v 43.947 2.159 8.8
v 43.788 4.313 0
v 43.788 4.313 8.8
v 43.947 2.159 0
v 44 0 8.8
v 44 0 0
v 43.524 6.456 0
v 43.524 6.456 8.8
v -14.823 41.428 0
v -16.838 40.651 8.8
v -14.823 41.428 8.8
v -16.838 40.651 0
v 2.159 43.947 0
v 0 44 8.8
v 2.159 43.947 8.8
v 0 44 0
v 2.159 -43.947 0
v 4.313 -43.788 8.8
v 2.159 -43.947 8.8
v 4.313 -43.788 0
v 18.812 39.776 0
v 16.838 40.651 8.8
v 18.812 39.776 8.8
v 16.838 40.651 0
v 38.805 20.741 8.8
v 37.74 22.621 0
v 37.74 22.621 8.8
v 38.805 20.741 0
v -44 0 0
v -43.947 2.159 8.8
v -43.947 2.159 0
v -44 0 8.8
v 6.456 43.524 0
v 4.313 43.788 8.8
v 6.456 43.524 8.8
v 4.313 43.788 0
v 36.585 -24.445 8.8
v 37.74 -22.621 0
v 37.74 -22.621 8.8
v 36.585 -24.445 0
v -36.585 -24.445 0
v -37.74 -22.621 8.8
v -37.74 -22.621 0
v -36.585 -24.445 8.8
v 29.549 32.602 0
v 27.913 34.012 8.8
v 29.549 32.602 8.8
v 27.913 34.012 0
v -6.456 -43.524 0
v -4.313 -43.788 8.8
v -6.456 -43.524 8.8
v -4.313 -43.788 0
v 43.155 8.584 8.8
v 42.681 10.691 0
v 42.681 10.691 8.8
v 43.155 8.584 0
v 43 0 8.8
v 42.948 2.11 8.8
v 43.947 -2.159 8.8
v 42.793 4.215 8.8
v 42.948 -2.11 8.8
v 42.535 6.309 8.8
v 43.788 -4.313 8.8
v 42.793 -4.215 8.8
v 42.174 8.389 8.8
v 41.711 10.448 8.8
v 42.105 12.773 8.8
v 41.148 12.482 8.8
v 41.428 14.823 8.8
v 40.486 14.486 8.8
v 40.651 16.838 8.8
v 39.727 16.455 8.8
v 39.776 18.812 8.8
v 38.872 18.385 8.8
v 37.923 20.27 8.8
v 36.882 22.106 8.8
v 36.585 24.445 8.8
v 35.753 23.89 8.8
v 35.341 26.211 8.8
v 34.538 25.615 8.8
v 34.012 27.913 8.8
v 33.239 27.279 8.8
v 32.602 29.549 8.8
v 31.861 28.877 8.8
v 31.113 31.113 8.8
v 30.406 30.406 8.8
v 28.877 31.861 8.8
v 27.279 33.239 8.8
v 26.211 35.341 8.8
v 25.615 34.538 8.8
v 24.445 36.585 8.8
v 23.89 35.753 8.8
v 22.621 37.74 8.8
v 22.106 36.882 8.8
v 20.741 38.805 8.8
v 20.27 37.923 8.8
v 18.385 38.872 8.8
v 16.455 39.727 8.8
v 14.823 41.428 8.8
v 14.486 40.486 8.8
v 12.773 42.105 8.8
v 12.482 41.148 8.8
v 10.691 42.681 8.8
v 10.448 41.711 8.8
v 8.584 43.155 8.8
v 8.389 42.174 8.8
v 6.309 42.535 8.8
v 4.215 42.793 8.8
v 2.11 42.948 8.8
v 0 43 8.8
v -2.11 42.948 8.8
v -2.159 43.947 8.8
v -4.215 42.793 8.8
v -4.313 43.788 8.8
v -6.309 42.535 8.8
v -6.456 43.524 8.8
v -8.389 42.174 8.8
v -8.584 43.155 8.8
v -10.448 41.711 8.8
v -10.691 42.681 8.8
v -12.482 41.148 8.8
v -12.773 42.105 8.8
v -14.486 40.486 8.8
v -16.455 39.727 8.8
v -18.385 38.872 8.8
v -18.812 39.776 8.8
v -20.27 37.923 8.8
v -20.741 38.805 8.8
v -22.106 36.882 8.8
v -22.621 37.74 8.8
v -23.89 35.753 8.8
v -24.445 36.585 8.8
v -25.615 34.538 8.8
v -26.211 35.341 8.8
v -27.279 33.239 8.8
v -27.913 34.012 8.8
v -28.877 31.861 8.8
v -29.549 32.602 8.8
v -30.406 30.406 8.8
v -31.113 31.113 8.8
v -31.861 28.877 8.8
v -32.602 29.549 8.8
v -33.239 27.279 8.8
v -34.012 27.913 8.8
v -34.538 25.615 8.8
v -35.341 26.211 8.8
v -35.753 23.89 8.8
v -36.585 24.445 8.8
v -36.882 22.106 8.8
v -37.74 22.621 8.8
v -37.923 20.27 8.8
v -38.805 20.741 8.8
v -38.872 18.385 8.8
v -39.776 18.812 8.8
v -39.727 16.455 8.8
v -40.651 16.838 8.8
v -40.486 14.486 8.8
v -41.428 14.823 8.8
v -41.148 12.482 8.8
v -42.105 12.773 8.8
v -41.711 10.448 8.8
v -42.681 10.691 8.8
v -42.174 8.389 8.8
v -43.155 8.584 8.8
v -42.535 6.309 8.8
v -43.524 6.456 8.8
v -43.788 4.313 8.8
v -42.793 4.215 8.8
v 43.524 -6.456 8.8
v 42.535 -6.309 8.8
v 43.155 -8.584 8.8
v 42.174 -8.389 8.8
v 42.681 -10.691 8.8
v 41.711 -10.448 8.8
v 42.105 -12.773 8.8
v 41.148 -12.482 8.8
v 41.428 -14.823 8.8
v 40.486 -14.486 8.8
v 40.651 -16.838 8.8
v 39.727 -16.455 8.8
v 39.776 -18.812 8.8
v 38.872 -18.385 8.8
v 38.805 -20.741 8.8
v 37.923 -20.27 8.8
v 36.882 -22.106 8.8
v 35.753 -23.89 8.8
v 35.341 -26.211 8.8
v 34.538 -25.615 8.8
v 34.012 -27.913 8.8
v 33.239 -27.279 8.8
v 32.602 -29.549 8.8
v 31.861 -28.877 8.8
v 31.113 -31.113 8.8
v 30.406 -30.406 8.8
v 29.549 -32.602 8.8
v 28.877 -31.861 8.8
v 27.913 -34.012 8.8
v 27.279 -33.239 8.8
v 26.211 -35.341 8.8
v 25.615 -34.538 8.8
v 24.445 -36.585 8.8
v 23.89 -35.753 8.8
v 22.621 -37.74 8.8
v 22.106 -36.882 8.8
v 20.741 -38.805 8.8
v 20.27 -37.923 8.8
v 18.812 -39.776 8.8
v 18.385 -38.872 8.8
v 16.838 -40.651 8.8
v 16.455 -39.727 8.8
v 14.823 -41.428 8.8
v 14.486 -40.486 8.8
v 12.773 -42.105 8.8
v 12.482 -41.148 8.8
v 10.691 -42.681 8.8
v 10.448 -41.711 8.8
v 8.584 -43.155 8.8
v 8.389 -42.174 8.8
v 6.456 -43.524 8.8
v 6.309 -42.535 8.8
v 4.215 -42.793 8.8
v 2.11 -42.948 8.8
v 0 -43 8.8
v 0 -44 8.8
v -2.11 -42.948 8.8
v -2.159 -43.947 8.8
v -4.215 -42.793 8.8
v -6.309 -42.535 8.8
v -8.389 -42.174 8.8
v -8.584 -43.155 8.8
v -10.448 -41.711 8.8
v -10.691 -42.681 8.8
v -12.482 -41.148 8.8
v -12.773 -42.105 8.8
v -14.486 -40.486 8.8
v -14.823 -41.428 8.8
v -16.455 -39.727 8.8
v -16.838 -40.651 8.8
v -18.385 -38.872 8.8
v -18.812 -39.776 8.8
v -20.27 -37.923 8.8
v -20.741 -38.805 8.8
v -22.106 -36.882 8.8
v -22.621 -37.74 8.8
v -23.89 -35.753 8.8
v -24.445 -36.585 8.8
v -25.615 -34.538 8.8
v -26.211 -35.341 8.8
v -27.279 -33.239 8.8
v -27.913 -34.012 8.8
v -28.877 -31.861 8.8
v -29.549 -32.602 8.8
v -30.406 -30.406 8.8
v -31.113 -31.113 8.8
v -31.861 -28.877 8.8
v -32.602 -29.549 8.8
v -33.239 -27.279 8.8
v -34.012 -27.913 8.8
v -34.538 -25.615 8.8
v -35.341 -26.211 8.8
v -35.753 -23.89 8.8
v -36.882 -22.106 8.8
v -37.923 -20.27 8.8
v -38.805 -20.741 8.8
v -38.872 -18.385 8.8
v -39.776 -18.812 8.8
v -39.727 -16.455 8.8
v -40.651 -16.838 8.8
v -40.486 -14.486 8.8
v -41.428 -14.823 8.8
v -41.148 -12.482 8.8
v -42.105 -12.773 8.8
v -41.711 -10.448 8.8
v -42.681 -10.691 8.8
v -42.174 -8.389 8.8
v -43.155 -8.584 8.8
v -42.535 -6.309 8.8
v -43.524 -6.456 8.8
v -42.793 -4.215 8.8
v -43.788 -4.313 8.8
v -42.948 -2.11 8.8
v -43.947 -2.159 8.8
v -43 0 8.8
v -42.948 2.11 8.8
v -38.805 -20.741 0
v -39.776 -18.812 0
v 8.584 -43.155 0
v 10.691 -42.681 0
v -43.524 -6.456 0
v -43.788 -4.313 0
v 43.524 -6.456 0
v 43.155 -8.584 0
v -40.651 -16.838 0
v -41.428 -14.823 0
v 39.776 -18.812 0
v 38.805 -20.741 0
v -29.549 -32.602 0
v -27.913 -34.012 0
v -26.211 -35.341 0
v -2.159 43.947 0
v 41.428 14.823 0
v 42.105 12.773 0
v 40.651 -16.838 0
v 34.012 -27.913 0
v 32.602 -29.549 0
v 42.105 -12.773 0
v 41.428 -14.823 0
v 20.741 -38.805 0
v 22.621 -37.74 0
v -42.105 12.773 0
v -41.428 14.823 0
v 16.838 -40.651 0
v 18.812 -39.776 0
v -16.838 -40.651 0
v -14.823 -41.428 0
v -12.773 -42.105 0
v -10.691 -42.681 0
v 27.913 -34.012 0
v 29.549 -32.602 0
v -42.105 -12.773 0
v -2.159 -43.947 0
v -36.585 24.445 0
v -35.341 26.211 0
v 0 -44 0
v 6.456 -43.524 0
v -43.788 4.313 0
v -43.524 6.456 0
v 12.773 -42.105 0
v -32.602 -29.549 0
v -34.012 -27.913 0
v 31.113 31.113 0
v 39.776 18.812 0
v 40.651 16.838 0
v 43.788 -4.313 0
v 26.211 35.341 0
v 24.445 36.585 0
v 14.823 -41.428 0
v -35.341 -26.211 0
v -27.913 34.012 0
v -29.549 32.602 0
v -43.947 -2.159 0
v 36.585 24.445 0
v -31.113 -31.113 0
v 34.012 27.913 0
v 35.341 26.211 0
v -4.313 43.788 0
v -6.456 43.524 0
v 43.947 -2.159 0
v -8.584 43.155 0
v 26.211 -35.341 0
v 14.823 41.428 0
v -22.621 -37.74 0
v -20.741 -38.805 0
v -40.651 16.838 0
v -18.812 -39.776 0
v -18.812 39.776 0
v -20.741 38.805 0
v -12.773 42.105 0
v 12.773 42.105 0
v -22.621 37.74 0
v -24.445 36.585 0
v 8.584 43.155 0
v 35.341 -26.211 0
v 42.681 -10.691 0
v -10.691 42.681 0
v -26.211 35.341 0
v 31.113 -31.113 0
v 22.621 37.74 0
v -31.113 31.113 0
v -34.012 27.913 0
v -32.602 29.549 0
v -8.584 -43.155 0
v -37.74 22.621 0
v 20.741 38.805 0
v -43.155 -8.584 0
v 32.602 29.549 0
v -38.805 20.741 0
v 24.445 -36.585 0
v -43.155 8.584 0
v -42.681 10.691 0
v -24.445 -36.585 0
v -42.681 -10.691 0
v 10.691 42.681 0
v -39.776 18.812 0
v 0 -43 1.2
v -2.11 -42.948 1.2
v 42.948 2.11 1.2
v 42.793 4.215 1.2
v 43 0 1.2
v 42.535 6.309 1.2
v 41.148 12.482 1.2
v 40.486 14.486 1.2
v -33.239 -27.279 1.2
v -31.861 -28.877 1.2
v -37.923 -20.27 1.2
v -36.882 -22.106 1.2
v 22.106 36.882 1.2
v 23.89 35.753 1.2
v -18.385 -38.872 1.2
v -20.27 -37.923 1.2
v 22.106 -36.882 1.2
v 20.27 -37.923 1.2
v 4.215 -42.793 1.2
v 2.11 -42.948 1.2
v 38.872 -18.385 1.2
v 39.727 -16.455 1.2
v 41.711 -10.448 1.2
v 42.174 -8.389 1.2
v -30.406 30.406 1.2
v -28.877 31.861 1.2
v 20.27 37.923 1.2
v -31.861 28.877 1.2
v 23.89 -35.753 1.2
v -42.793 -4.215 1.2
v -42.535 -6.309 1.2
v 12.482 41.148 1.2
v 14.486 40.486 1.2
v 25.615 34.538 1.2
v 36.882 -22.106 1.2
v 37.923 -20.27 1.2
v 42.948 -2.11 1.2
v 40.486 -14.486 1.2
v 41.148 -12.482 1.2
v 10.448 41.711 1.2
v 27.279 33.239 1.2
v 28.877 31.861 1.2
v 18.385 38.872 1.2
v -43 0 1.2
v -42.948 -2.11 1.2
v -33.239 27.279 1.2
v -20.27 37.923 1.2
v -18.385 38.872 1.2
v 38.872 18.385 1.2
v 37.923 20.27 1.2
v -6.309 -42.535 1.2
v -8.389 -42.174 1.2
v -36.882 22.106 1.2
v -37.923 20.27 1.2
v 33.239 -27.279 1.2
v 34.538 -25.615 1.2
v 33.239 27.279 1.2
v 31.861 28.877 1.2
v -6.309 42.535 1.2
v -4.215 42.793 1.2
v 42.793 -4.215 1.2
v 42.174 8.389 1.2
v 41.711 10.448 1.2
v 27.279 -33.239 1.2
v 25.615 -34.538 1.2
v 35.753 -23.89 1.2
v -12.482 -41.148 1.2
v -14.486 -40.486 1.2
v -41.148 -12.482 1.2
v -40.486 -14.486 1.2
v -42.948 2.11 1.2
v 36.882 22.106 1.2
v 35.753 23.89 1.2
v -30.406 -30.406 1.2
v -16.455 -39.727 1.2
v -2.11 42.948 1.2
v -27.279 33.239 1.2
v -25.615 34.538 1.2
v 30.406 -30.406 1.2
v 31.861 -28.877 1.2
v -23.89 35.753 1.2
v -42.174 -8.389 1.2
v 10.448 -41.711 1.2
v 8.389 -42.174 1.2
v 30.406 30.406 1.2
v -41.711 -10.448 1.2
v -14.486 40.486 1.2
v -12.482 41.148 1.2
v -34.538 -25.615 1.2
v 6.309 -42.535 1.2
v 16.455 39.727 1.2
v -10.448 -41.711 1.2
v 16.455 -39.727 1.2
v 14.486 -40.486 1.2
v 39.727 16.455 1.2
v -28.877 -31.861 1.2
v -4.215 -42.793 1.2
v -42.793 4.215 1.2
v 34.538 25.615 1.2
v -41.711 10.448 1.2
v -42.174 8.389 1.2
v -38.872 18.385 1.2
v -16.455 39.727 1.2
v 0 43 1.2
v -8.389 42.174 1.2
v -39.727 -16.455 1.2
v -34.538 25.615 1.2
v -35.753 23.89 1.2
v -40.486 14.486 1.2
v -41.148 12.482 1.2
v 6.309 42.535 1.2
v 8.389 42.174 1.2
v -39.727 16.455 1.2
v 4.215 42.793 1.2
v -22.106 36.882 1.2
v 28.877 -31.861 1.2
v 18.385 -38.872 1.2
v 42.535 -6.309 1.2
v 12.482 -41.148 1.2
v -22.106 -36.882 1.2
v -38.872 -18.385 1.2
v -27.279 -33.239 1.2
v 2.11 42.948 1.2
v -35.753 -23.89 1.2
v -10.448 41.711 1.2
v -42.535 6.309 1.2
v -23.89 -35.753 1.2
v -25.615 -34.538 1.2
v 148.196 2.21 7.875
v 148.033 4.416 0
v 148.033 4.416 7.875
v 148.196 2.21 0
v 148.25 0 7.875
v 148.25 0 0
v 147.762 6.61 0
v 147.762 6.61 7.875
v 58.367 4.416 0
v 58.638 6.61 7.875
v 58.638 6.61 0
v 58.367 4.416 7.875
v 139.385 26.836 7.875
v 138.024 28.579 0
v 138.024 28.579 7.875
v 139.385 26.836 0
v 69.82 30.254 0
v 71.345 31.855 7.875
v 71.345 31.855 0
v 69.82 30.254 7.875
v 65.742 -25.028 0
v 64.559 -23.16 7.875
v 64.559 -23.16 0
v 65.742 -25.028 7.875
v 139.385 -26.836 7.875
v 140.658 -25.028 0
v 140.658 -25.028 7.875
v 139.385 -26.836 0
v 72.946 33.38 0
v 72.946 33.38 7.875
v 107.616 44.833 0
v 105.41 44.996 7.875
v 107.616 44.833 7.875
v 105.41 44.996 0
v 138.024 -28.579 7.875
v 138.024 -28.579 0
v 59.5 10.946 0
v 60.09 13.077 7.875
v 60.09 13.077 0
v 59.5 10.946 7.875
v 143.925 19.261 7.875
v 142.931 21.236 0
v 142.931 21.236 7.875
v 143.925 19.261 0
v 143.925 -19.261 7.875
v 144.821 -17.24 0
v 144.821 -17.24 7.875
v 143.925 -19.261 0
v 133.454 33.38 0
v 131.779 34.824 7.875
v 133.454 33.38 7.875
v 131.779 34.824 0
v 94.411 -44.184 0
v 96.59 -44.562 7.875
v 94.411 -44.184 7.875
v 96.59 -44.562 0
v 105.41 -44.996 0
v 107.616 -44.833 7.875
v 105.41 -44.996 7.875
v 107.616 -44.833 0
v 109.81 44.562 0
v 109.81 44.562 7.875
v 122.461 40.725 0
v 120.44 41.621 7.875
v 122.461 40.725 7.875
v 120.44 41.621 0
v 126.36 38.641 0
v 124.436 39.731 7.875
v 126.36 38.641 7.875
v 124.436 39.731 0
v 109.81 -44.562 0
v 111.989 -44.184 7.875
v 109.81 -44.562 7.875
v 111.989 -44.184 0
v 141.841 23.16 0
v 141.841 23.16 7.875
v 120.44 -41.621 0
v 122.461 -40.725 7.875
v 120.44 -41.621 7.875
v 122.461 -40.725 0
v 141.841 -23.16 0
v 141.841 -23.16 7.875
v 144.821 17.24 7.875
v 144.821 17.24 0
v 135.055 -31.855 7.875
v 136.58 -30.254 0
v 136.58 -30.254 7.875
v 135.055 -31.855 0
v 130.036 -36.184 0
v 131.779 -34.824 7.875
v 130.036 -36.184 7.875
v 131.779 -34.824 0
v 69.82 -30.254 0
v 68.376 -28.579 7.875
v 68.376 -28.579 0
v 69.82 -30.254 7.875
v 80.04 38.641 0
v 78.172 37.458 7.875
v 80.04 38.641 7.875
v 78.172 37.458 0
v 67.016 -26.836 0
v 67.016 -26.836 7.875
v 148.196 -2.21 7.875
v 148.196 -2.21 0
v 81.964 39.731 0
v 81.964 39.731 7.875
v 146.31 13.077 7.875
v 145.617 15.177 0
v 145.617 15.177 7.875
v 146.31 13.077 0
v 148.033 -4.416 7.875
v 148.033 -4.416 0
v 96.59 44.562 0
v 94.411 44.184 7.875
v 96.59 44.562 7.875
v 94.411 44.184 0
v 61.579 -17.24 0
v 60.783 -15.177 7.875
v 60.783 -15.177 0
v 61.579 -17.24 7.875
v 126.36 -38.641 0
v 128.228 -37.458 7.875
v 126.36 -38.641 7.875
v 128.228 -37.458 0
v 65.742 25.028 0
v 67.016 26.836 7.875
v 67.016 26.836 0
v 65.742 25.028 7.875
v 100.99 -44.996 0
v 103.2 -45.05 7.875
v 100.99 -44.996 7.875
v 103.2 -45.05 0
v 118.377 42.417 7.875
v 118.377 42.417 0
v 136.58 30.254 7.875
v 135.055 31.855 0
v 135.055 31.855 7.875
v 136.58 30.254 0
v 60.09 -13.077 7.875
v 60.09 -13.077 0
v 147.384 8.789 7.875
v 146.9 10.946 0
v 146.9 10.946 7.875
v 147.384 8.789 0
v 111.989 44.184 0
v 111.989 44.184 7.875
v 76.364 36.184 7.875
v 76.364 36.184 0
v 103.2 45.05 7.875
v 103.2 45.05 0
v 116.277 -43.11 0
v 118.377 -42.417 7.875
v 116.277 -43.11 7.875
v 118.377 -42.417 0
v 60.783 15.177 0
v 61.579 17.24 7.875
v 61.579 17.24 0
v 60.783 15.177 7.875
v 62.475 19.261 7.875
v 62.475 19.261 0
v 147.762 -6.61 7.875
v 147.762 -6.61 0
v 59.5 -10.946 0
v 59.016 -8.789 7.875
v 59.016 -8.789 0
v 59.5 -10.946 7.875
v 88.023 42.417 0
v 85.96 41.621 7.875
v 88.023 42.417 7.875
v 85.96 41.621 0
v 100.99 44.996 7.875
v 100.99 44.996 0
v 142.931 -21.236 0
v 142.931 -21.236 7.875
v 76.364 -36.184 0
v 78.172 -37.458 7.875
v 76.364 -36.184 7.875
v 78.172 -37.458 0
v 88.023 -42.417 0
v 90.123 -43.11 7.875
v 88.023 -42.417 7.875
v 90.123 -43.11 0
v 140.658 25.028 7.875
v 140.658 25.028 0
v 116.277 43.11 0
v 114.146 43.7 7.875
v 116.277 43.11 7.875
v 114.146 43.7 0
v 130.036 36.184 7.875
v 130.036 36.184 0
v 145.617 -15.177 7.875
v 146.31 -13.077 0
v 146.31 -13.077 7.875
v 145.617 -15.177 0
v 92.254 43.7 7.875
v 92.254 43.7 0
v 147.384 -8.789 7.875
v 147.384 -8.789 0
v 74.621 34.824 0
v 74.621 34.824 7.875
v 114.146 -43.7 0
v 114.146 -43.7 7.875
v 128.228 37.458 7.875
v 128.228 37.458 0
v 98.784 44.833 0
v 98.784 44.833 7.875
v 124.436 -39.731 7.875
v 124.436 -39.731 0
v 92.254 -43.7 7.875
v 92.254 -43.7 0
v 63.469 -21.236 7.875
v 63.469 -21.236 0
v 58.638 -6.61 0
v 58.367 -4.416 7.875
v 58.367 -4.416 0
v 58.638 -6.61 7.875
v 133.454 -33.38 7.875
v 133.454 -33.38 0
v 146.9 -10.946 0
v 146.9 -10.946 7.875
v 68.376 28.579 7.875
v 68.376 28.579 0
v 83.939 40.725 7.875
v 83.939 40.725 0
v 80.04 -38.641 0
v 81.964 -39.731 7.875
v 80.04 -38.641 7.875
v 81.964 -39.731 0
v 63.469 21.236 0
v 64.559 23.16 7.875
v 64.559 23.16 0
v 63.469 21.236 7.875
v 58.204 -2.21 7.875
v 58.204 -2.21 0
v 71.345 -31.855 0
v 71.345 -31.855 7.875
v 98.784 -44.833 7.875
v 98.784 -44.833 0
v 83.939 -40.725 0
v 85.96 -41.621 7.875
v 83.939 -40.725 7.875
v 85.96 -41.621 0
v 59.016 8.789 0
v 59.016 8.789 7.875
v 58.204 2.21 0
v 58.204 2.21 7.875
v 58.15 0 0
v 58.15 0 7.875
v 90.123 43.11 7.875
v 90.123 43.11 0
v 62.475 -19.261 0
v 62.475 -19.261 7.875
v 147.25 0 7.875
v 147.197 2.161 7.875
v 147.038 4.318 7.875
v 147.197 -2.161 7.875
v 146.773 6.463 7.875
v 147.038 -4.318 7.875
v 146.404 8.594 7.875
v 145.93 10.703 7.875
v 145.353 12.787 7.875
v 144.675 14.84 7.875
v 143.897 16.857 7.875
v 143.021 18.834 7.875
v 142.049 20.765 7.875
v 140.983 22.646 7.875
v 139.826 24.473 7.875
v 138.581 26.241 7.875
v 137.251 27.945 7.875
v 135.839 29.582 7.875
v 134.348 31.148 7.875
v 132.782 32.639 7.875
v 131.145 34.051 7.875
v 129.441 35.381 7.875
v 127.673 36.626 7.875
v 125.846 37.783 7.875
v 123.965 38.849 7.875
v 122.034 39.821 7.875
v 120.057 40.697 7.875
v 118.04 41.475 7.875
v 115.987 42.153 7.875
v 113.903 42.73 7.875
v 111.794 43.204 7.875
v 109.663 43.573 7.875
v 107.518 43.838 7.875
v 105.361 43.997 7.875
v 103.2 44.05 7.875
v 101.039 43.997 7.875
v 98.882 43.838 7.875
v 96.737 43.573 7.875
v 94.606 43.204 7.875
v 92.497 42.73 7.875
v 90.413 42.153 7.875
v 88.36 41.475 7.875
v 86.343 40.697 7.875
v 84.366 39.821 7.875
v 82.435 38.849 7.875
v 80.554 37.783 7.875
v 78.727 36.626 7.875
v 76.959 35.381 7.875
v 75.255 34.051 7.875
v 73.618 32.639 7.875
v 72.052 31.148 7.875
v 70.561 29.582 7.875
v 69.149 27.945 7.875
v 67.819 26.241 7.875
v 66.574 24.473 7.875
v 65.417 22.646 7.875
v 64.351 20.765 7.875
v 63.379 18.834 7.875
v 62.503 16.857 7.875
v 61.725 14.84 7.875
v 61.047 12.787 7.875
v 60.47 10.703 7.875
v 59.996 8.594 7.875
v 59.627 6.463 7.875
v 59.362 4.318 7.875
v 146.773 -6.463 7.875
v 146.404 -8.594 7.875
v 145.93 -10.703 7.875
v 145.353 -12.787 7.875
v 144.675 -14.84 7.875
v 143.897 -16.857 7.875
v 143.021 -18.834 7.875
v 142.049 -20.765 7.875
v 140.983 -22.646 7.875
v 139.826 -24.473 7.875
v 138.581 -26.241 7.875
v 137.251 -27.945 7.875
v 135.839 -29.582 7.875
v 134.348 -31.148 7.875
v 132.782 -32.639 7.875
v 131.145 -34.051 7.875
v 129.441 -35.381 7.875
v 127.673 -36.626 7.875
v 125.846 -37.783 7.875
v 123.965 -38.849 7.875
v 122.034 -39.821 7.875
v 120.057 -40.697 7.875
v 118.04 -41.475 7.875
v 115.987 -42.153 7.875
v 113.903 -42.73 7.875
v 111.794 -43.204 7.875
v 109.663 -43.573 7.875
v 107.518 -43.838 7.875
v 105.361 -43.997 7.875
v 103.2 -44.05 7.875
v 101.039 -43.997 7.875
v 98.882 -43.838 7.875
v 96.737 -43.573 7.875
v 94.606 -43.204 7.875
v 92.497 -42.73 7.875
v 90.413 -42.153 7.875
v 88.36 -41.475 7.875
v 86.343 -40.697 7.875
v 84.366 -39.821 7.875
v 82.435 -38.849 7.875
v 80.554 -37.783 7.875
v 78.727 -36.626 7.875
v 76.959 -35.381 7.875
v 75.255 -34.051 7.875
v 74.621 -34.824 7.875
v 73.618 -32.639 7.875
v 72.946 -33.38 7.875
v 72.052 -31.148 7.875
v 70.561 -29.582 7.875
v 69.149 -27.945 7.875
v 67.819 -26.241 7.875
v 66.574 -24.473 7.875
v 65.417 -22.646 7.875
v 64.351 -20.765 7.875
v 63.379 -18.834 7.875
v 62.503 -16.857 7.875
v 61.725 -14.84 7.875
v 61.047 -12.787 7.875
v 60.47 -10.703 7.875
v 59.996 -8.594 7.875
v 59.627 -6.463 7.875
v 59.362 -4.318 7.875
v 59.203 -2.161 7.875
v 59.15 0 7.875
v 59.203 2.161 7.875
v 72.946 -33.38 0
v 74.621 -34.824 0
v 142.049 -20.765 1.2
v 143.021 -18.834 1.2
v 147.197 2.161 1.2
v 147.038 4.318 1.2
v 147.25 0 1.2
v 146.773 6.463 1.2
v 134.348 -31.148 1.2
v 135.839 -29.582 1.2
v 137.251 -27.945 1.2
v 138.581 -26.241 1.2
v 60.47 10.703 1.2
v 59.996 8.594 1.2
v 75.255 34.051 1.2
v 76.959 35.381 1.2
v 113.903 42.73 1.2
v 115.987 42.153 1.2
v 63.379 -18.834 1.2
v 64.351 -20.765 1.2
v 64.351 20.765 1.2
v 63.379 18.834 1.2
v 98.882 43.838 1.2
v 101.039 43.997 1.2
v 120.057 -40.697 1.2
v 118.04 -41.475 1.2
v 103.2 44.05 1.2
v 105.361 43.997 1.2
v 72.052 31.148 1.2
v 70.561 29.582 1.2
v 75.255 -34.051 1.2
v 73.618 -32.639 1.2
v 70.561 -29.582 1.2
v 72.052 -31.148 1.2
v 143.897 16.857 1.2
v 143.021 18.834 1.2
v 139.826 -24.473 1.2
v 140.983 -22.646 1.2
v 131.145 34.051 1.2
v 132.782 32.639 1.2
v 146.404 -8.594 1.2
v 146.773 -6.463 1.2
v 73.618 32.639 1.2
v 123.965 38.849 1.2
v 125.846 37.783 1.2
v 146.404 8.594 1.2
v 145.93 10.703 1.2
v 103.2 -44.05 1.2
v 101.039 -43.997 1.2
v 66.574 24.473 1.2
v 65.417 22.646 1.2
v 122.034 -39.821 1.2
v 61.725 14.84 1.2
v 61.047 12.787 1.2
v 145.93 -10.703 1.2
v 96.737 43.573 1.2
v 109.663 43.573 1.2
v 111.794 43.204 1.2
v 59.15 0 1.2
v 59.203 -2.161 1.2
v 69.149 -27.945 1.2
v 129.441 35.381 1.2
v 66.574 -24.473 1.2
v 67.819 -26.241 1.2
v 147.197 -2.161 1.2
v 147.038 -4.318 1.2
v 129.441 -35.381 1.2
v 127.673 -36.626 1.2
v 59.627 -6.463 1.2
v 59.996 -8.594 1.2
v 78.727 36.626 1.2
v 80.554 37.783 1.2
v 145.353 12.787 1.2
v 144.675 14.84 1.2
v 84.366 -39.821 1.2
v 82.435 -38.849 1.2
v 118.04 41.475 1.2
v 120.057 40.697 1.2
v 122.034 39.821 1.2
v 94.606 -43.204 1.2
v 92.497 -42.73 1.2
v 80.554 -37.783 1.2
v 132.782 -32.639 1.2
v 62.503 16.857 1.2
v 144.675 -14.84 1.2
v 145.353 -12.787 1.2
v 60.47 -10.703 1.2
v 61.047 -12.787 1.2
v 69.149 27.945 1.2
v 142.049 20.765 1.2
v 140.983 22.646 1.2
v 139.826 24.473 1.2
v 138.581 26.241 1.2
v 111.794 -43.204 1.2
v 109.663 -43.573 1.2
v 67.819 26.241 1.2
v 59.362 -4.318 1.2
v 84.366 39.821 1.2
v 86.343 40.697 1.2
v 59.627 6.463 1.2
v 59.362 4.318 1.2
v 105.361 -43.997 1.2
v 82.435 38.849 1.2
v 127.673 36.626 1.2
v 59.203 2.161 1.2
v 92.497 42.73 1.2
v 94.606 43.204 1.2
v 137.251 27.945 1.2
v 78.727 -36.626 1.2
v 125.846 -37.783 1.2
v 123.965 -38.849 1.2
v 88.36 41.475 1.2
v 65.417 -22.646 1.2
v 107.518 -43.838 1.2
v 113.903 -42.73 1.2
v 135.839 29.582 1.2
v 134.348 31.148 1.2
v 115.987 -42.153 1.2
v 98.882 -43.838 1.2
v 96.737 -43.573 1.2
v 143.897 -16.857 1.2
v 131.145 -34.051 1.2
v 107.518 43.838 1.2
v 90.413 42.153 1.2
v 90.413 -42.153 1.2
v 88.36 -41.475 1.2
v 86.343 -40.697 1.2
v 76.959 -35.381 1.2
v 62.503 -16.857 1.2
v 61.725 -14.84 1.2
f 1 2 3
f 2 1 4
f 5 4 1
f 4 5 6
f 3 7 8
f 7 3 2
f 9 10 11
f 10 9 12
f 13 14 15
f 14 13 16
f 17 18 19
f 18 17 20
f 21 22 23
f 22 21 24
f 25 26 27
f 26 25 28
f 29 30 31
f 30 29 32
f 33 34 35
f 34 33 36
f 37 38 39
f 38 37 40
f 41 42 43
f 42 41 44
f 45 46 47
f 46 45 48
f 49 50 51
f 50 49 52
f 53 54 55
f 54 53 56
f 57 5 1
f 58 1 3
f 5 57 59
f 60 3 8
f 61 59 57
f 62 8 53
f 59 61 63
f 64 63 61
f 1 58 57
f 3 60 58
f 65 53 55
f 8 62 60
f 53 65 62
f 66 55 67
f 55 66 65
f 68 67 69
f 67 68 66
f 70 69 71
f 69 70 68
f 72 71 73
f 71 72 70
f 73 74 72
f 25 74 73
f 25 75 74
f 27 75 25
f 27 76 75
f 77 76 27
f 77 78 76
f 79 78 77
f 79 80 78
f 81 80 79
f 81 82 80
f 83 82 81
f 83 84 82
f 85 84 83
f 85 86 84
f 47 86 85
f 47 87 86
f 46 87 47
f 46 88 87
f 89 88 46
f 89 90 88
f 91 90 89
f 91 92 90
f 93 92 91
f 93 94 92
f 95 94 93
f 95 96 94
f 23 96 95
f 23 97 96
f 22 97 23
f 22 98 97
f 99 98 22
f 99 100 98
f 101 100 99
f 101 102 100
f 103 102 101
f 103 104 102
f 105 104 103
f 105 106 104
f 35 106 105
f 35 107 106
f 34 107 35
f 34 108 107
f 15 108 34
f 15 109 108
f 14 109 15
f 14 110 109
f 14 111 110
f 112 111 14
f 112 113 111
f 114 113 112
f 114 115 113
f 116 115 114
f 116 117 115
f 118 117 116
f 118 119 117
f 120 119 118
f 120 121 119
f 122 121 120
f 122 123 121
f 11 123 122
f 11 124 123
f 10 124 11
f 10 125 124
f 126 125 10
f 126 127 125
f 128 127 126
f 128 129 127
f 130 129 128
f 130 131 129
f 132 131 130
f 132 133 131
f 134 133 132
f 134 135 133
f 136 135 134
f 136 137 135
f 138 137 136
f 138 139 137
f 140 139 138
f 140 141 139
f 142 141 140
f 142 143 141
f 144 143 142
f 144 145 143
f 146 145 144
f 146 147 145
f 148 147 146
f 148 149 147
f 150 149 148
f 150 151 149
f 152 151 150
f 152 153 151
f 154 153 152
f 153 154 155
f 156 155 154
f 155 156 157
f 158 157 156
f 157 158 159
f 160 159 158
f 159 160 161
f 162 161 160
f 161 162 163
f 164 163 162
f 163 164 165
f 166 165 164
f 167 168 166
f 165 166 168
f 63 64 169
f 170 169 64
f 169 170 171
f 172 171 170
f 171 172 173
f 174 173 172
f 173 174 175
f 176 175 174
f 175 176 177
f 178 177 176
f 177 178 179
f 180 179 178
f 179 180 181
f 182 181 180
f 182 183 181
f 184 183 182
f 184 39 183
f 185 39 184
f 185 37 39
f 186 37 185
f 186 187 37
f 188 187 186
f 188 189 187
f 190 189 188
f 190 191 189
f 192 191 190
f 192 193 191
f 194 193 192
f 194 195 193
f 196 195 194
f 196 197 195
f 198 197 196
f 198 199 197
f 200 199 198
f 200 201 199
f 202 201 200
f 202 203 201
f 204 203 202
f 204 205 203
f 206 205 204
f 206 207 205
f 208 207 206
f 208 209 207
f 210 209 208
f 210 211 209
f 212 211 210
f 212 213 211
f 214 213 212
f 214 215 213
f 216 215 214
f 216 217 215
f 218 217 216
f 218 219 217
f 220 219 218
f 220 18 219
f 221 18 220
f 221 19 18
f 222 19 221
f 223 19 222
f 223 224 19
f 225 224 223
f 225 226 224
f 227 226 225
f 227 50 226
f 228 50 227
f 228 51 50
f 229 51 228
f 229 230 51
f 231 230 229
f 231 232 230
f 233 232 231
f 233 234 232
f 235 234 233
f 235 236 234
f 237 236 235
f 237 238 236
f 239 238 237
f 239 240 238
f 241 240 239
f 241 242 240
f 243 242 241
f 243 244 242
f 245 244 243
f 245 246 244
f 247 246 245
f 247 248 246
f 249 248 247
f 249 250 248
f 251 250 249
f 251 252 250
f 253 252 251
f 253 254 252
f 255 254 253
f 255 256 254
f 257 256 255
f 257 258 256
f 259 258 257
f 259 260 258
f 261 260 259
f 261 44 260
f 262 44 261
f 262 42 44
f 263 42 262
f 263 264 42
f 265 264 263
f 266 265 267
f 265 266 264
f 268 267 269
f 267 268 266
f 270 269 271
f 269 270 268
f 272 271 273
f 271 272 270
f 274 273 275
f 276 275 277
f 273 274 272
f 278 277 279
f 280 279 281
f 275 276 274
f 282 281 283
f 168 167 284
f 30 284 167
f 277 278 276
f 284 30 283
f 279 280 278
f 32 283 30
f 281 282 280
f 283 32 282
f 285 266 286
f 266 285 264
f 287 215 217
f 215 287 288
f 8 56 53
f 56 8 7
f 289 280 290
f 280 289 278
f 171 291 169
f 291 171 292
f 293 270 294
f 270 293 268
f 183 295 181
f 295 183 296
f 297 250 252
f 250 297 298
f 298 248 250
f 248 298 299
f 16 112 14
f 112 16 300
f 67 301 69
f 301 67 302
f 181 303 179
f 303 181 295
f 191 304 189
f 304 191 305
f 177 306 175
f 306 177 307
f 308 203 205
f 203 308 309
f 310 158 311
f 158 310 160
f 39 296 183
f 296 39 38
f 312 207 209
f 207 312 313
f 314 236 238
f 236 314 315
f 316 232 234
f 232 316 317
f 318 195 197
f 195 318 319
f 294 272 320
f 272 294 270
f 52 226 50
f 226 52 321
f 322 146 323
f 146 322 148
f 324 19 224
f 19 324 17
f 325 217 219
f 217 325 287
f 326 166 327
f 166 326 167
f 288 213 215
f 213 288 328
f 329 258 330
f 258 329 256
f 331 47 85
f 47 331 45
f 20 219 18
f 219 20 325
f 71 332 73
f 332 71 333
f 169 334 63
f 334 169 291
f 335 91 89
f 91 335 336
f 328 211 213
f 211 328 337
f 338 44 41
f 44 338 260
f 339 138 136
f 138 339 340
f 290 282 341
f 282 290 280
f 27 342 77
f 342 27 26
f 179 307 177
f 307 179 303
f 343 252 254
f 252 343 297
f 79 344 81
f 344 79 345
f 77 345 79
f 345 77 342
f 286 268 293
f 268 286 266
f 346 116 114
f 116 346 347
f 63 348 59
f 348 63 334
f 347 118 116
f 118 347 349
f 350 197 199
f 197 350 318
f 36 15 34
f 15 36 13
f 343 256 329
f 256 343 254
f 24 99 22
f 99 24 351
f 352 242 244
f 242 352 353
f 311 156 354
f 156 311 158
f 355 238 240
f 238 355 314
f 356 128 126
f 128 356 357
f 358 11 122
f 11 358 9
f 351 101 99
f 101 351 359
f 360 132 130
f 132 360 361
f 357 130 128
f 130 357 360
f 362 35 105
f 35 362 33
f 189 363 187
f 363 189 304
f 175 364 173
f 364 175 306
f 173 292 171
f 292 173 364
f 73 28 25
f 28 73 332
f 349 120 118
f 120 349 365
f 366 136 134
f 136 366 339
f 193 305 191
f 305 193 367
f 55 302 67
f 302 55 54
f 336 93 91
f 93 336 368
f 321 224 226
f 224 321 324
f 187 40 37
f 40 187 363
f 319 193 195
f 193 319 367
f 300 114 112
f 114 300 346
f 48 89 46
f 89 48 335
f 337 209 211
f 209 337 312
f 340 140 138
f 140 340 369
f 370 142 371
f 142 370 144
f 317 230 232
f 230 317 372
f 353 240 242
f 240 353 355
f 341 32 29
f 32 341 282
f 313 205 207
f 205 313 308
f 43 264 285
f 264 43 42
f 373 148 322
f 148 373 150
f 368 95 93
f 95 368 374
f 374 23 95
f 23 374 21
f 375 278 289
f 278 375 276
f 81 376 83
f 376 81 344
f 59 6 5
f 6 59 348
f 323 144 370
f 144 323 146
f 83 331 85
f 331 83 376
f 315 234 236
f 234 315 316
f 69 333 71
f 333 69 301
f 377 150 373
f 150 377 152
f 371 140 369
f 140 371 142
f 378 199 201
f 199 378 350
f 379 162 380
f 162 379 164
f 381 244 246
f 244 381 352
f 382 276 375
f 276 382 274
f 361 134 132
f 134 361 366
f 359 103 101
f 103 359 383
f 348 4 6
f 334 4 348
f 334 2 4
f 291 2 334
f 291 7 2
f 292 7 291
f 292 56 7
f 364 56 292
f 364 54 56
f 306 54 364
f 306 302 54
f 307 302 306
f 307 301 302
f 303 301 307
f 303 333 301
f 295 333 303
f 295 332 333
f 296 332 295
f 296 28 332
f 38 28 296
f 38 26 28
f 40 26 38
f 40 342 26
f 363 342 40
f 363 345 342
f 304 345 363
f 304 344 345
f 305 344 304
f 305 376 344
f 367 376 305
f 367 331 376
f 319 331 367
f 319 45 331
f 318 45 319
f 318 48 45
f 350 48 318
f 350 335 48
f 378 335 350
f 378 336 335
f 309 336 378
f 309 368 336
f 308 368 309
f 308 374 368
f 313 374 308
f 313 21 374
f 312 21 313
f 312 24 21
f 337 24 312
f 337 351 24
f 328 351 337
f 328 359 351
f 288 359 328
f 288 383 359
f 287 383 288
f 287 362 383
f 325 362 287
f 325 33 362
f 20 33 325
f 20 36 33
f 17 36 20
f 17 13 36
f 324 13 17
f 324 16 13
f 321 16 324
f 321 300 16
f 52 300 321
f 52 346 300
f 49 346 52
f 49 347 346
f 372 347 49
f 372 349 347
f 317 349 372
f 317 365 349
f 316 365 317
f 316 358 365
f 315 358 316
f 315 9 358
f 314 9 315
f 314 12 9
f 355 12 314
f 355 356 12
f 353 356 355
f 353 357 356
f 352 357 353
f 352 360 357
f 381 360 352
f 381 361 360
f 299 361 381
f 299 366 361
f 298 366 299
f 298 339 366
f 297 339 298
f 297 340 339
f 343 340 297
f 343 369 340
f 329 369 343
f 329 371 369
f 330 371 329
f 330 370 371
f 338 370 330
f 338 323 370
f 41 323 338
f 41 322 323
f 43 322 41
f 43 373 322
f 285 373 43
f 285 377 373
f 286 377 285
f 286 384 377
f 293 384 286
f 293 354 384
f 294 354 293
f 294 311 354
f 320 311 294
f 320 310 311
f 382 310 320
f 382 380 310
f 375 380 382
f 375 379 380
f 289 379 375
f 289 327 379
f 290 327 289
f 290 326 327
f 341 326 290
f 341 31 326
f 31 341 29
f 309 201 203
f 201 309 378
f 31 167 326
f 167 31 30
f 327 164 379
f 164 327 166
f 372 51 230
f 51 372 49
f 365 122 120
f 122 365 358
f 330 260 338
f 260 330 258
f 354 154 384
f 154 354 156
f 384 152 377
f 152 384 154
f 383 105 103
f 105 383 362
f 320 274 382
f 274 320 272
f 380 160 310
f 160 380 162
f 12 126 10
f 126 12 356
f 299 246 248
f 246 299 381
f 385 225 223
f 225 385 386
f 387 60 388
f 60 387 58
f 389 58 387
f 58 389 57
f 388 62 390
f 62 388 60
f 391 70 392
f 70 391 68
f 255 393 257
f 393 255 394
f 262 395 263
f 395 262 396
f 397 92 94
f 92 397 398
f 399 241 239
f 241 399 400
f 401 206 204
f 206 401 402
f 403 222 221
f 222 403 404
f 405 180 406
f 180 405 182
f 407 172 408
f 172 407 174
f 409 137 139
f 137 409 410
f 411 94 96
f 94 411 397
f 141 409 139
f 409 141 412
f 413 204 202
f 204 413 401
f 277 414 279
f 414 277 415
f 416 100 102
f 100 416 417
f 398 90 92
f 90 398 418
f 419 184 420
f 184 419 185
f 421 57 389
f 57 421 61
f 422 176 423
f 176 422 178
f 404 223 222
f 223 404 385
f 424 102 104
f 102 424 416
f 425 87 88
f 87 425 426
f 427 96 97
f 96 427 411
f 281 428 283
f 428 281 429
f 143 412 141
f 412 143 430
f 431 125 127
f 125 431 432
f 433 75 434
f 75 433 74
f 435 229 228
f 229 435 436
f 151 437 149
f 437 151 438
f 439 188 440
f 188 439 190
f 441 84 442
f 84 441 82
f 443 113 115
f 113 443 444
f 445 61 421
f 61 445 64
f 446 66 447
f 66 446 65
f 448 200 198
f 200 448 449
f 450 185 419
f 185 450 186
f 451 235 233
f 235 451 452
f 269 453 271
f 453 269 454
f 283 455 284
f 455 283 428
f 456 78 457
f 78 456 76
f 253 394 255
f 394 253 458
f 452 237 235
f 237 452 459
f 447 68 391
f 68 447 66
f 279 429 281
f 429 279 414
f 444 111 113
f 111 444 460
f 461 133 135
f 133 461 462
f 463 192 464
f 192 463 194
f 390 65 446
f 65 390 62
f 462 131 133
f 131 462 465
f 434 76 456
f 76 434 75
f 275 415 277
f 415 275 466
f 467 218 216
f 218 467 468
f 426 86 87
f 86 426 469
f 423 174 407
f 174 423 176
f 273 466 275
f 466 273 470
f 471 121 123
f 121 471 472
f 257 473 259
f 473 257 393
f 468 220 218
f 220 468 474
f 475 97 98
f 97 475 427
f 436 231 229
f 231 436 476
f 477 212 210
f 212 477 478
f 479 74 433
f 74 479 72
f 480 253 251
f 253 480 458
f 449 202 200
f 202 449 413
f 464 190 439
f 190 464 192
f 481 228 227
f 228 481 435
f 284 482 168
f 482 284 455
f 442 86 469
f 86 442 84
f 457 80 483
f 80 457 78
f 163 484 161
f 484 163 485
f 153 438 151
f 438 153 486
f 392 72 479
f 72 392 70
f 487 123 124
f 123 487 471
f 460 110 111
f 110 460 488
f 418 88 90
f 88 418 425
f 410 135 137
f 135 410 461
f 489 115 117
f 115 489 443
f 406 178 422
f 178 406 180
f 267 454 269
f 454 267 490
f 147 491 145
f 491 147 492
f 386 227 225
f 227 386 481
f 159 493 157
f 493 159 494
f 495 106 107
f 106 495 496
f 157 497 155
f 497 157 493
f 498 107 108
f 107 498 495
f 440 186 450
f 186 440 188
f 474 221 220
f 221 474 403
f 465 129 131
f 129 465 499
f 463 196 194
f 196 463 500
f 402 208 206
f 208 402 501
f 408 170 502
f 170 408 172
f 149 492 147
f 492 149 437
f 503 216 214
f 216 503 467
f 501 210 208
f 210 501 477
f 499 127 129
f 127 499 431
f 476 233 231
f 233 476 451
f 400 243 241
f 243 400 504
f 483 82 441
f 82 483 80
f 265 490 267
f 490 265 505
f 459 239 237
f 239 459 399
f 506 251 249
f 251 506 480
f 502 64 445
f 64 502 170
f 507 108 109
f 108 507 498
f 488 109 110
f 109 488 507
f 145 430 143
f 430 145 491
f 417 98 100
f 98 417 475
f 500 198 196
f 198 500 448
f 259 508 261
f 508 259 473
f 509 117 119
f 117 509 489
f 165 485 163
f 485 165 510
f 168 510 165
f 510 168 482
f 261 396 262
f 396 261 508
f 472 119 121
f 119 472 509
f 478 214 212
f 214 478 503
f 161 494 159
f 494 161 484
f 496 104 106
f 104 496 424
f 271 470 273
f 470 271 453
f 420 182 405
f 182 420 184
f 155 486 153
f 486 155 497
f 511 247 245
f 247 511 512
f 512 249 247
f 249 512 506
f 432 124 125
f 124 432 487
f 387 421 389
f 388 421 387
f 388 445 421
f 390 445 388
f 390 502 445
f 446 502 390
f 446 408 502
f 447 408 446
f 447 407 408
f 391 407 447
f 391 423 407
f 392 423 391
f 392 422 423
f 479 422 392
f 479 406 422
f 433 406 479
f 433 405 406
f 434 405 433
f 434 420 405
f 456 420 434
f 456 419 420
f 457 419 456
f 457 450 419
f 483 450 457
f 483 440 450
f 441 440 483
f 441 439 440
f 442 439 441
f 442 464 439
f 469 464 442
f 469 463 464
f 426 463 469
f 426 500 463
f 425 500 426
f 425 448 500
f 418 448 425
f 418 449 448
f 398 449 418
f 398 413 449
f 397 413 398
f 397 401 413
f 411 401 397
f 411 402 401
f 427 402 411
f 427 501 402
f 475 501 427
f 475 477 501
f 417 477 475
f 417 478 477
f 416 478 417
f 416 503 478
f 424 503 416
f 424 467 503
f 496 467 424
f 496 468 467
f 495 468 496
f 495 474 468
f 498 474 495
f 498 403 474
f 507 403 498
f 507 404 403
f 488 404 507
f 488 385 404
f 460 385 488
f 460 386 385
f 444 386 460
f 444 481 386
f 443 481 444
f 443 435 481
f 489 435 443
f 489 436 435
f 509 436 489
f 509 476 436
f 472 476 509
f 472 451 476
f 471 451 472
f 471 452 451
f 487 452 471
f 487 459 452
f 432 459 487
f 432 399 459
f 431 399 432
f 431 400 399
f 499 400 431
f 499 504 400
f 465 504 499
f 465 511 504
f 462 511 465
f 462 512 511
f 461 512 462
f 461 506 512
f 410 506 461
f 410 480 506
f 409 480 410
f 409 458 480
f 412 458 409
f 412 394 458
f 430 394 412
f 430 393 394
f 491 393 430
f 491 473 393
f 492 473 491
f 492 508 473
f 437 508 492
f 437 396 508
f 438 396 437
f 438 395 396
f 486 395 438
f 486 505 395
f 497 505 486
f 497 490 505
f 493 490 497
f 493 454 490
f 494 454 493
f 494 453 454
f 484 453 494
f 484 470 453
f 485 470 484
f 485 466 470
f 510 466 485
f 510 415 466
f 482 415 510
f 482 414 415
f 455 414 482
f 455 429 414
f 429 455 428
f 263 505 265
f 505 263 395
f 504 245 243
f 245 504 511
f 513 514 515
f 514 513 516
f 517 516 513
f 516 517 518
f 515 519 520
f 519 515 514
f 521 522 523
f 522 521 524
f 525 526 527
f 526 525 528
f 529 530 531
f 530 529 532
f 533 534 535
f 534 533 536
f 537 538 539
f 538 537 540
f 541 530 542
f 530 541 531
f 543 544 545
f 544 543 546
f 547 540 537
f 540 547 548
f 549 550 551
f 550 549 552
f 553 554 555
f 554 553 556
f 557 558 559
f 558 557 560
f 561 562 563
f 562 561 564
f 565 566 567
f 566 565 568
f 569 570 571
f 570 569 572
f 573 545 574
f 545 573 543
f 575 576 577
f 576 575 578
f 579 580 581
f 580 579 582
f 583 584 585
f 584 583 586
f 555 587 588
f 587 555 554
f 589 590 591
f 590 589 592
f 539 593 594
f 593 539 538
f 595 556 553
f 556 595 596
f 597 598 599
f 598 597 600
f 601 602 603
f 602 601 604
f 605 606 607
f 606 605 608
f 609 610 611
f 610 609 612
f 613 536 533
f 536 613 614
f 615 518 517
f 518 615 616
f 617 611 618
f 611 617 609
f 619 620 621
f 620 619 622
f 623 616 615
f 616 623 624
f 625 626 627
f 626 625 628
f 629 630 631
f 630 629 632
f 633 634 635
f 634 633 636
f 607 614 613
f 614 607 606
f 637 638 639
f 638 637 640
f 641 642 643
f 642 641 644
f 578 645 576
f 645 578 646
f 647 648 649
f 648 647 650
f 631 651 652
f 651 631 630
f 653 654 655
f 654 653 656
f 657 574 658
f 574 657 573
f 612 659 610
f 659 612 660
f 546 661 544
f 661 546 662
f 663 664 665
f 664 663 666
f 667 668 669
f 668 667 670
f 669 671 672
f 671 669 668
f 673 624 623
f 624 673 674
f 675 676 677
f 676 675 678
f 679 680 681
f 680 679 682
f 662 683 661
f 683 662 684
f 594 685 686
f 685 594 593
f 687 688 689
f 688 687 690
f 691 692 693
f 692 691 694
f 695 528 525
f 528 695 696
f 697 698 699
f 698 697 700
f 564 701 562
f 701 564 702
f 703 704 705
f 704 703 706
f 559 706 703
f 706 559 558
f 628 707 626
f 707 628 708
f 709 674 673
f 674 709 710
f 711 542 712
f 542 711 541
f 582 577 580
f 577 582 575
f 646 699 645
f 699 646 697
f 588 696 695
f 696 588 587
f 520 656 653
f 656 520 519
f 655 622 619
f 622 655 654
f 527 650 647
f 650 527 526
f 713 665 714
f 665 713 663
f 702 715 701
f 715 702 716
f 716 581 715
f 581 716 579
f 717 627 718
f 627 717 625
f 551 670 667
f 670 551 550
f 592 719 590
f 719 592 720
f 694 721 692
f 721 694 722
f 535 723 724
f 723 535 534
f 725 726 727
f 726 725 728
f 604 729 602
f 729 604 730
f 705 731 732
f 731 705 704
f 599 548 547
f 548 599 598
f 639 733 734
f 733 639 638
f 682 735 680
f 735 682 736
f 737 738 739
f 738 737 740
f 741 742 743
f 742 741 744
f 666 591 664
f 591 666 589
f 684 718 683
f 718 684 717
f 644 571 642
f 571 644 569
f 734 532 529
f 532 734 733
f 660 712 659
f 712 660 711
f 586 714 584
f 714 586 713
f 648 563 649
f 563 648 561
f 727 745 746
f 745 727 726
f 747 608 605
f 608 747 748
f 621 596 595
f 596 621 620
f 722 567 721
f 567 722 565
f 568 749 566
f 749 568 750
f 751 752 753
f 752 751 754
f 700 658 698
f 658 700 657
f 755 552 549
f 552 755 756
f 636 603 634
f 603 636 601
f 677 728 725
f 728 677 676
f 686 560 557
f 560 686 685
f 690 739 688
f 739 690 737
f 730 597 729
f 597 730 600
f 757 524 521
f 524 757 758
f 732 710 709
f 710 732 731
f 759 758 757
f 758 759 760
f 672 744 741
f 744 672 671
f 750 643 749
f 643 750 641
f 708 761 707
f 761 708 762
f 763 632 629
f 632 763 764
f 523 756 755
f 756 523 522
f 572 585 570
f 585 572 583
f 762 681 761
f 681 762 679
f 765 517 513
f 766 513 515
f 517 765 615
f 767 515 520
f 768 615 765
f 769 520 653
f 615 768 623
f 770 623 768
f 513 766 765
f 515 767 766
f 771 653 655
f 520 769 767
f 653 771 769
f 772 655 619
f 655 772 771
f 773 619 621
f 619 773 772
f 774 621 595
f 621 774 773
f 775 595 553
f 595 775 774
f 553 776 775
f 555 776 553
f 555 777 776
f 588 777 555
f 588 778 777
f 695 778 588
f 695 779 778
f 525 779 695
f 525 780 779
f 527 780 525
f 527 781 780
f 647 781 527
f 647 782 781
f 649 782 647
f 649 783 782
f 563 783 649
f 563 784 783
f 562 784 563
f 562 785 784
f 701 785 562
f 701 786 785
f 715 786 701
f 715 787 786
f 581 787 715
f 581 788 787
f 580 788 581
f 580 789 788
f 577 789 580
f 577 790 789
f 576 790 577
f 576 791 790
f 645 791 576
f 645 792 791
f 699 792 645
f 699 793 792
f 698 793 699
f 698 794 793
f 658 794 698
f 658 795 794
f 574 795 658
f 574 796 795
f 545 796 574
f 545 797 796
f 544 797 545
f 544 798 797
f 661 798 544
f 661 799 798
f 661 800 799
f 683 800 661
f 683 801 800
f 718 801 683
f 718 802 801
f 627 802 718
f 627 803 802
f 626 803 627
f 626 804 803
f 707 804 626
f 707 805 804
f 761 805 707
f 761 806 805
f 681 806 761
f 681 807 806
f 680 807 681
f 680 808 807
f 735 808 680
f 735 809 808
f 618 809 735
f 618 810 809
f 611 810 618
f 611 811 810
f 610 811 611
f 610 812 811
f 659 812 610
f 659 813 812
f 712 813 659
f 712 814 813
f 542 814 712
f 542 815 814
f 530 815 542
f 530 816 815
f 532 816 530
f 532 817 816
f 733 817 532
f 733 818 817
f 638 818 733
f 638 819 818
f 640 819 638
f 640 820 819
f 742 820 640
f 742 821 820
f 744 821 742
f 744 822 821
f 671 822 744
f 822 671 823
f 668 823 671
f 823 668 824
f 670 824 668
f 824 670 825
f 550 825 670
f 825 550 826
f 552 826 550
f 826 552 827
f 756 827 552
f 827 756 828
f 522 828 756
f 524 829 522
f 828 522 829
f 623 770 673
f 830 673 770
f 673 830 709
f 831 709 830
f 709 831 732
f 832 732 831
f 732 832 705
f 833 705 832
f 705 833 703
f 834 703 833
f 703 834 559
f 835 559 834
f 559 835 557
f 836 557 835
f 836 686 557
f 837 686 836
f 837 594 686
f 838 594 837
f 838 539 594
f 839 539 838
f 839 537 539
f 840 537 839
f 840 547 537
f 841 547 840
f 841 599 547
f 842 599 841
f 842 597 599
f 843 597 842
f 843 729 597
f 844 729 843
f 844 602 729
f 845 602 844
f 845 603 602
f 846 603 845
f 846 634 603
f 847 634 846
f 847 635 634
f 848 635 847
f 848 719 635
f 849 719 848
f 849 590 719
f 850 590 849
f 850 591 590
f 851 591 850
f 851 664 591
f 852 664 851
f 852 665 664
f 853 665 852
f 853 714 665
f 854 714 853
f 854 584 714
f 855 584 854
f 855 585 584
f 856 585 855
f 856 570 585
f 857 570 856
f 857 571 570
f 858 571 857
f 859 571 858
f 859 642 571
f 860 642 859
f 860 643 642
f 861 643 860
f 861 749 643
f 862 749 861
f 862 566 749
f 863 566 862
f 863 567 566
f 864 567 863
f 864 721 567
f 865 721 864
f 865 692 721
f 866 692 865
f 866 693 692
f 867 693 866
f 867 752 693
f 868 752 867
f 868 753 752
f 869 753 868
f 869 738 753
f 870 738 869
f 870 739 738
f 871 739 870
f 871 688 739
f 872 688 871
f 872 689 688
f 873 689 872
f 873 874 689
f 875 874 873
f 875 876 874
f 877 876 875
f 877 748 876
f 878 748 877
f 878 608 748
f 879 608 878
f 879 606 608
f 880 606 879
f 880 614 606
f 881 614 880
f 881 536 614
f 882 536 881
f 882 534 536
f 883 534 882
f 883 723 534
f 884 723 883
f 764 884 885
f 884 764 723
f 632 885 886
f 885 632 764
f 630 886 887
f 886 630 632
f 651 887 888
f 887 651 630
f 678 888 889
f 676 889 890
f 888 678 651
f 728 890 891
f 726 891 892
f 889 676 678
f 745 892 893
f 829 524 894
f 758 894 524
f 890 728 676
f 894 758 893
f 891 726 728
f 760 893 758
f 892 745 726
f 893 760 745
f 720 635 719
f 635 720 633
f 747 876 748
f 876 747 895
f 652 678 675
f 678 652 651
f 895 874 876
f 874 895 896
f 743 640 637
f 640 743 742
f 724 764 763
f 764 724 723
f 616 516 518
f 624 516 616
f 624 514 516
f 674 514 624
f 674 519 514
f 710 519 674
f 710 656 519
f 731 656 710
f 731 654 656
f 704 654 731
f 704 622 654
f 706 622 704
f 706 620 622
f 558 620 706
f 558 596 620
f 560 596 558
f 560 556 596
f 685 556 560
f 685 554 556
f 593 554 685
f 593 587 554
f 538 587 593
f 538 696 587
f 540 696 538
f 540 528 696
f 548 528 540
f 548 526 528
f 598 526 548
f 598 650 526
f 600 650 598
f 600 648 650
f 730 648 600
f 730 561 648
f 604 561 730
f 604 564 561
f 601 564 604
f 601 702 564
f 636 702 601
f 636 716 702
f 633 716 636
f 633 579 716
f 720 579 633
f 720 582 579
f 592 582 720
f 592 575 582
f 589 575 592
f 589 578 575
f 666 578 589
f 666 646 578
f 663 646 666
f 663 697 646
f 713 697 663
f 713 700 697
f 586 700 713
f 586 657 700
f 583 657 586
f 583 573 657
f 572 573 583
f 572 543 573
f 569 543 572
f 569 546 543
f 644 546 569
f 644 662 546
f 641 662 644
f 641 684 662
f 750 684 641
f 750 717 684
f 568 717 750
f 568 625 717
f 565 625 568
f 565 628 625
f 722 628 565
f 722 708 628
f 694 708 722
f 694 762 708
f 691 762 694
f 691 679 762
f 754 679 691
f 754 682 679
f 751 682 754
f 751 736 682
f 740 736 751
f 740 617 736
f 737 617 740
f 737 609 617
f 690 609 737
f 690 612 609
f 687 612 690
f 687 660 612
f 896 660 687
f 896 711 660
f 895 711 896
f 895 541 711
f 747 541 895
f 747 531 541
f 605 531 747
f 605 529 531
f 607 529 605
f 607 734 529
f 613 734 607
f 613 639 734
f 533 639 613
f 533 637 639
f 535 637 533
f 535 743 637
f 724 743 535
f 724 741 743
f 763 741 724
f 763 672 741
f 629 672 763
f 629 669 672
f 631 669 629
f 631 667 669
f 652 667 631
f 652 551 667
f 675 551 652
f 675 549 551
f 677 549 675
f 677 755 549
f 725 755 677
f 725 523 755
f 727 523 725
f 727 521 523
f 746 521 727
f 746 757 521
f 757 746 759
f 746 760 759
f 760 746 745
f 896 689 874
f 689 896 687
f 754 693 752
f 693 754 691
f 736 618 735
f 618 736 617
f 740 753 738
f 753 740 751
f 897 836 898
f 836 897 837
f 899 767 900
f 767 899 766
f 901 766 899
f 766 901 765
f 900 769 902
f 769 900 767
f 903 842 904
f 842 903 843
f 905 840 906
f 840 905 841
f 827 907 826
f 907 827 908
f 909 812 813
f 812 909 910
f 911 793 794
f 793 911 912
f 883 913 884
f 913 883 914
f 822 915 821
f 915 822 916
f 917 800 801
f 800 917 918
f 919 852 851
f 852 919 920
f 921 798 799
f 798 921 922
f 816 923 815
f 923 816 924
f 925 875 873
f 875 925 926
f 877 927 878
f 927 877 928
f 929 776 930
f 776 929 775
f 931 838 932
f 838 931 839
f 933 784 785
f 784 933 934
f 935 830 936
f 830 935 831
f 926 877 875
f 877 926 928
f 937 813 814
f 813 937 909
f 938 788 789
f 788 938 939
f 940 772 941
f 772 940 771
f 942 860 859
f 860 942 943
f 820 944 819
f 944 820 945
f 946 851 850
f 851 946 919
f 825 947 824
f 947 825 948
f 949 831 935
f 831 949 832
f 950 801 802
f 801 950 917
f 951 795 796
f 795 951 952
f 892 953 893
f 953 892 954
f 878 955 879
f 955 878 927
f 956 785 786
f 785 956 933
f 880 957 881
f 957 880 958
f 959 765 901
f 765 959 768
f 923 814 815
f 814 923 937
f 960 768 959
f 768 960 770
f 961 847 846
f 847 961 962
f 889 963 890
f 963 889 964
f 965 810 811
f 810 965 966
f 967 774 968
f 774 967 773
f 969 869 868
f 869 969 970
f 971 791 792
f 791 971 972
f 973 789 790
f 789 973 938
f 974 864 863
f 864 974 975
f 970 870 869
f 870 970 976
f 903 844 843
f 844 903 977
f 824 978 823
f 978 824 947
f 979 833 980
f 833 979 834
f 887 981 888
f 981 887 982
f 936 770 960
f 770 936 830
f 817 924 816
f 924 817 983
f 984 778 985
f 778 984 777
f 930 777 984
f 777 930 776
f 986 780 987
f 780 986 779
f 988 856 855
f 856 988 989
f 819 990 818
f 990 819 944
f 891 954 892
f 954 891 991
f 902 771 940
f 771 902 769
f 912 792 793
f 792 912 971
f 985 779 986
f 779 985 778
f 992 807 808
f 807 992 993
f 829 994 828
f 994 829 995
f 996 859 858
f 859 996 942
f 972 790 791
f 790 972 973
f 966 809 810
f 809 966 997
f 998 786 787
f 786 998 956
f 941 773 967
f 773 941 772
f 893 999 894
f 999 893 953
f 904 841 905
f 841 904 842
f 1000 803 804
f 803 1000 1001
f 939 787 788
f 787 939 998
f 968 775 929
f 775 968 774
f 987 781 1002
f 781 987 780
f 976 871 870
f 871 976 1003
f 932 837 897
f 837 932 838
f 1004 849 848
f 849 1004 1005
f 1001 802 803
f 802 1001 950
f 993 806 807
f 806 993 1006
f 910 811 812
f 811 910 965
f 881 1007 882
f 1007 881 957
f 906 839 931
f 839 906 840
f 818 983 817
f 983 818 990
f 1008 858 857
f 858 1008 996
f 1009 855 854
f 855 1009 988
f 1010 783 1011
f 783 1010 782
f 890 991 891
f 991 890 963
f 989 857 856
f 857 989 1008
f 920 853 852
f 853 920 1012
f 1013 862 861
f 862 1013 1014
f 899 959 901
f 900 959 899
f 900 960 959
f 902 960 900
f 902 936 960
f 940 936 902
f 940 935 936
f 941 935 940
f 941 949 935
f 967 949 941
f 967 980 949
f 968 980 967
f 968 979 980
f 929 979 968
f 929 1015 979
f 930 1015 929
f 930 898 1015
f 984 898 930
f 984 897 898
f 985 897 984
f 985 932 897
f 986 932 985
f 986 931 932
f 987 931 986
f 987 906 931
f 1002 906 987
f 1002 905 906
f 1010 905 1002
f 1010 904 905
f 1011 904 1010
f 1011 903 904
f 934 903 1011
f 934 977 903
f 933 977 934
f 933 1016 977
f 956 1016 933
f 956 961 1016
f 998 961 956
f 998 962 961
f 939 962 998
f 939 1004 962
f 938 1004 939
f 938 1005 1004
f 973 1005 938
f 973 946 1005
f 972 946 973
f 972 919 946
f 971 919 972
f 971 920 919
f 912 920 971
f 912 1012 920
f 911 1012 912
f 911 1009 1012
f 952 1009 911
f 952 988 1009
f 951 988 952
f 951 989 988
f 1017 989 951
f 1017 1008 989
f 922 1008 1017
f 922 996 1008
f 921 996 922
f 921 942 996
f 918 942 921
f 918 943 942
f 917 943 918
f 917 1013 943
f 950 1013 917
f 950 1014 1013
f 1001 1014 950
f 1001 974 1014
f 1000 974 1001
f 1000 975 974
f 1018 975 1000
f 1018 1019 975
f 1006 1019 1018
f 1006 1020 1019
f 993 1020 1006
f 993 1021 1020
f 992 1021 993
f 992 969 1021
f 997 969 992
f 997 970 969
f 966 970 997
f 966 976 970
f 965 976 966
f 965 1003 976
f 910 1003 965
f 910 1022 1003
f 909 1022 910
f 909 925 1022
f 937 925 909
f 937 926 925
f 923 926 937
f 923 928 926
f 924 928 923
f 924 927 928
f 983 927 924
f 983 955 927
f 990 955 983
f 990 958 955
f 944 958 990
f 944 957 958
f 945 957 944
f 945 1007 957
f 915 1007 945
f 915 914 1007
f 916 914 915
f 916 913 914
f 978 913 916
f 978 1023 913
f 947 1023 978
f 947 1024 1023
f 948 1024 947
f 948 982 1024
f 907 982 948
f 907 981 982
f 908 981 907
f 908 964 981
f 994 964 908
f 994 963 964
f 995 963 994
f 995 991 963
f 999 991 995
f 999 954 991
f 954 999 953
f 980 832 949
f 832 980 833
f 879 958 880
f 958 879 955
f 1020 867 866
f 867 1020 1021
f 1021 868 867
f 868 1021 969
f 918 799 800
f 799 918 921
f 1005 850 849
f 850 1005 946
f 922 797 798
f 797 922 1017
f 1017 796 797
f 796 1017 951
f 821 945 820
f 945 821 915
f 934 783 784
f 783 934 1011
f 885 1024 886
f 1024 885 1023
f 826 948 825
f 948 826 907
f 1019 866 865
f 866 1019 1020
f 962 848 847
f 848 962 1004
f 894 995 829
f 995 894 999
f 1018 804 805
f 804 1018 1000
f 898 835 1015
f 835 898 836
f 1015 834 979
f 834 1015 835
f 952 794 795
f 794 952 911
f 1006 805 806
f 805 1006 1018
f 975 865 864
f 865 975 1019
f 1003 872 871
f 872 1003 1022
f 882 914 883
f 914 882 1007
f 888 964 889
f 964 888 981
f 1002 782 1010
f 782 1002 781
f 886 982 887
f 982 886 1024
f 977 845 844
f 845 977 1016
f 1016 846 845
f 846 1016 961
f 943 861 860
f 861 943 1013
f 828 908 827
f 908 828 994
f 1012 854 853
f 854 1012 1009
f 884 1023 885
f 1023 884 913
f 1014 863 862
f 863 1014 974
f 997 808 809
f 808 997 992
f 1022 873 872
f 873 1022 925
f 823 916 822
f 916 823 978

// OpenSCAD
/**
 * Round box with overlapping lid
 *
 * I use this to store filters and adapter rings for my photocamera. 
 * I print these in TPU for better protection, it also helps the lid
 * to stay on the box more firmly.
 *
 * Copyright Hendrik Busch, 2022
 */
 
 
/* [General settings] */
 
// The diameter of the object that is supposed to fit inside
Inner_Diameter = 86; // [10:0.1:100]
 
// The height of the object that is supposed to fit inside
Inner_Height = 7.6; // [1:0.1:40]

// Lid overlap percentage. I recommend to set this to at least 50%, for smaller object even higher.
Lid_Overlap = 75; // [5:5:100]

// Top/bottom wall thickness
Top_Bottom_Wall_Thickness = 1.2; // [0.2:0.1:5]

// Side wall thickness
Side_Wall_Thickness = 1; // [0.2:0.2:5]

/* [Fine tuning] */

// Gap between the box and the lid.
Lid_Gap = 0.1; // [0:0.1:1]

/* [Hidden] */
$fn = 128;
f = 0.01;
df = f*2;

module box_cylinder(inner_diameter, inner_height, bottom_wall_thickness, side_wall_thickness) {
    outer_diameter = inner_diameter + side_wall_thickness*2;
    outer_height = inner_height + bottom_wall_thickness;
    
    difference() {
        cylinder(d = outer_diameter, h = outer_height);
        translate([0, 0, bottom_wall_thickness])
            cylinder(d = inner_diameter, h = inner_height + f);
    }
}

module box() {
    box_cylinder(Inner_Diameter, Inner_Height, Top_Bottom_Wall_Thickness, Side_Wall_Thickness);
}   

module lid() {
    lid_inner_diameter = Inner_Diameter + Side_Wall_Thickness*2 + Lid_Gap;
    lid_inner_height = (Lid_Overlap / 100) * (Inner_Height + Top_Bottom_Wall_Thickness + Lid_Gap); 
    box_cylinder(lid_inner_diameter, lid_inner_height, Top_Bottom_Wall_Thickness, Side_Wall_Thickness);
}

box();
translate([Inner_Diameter * 1.2, 0, 0])
    lid();
